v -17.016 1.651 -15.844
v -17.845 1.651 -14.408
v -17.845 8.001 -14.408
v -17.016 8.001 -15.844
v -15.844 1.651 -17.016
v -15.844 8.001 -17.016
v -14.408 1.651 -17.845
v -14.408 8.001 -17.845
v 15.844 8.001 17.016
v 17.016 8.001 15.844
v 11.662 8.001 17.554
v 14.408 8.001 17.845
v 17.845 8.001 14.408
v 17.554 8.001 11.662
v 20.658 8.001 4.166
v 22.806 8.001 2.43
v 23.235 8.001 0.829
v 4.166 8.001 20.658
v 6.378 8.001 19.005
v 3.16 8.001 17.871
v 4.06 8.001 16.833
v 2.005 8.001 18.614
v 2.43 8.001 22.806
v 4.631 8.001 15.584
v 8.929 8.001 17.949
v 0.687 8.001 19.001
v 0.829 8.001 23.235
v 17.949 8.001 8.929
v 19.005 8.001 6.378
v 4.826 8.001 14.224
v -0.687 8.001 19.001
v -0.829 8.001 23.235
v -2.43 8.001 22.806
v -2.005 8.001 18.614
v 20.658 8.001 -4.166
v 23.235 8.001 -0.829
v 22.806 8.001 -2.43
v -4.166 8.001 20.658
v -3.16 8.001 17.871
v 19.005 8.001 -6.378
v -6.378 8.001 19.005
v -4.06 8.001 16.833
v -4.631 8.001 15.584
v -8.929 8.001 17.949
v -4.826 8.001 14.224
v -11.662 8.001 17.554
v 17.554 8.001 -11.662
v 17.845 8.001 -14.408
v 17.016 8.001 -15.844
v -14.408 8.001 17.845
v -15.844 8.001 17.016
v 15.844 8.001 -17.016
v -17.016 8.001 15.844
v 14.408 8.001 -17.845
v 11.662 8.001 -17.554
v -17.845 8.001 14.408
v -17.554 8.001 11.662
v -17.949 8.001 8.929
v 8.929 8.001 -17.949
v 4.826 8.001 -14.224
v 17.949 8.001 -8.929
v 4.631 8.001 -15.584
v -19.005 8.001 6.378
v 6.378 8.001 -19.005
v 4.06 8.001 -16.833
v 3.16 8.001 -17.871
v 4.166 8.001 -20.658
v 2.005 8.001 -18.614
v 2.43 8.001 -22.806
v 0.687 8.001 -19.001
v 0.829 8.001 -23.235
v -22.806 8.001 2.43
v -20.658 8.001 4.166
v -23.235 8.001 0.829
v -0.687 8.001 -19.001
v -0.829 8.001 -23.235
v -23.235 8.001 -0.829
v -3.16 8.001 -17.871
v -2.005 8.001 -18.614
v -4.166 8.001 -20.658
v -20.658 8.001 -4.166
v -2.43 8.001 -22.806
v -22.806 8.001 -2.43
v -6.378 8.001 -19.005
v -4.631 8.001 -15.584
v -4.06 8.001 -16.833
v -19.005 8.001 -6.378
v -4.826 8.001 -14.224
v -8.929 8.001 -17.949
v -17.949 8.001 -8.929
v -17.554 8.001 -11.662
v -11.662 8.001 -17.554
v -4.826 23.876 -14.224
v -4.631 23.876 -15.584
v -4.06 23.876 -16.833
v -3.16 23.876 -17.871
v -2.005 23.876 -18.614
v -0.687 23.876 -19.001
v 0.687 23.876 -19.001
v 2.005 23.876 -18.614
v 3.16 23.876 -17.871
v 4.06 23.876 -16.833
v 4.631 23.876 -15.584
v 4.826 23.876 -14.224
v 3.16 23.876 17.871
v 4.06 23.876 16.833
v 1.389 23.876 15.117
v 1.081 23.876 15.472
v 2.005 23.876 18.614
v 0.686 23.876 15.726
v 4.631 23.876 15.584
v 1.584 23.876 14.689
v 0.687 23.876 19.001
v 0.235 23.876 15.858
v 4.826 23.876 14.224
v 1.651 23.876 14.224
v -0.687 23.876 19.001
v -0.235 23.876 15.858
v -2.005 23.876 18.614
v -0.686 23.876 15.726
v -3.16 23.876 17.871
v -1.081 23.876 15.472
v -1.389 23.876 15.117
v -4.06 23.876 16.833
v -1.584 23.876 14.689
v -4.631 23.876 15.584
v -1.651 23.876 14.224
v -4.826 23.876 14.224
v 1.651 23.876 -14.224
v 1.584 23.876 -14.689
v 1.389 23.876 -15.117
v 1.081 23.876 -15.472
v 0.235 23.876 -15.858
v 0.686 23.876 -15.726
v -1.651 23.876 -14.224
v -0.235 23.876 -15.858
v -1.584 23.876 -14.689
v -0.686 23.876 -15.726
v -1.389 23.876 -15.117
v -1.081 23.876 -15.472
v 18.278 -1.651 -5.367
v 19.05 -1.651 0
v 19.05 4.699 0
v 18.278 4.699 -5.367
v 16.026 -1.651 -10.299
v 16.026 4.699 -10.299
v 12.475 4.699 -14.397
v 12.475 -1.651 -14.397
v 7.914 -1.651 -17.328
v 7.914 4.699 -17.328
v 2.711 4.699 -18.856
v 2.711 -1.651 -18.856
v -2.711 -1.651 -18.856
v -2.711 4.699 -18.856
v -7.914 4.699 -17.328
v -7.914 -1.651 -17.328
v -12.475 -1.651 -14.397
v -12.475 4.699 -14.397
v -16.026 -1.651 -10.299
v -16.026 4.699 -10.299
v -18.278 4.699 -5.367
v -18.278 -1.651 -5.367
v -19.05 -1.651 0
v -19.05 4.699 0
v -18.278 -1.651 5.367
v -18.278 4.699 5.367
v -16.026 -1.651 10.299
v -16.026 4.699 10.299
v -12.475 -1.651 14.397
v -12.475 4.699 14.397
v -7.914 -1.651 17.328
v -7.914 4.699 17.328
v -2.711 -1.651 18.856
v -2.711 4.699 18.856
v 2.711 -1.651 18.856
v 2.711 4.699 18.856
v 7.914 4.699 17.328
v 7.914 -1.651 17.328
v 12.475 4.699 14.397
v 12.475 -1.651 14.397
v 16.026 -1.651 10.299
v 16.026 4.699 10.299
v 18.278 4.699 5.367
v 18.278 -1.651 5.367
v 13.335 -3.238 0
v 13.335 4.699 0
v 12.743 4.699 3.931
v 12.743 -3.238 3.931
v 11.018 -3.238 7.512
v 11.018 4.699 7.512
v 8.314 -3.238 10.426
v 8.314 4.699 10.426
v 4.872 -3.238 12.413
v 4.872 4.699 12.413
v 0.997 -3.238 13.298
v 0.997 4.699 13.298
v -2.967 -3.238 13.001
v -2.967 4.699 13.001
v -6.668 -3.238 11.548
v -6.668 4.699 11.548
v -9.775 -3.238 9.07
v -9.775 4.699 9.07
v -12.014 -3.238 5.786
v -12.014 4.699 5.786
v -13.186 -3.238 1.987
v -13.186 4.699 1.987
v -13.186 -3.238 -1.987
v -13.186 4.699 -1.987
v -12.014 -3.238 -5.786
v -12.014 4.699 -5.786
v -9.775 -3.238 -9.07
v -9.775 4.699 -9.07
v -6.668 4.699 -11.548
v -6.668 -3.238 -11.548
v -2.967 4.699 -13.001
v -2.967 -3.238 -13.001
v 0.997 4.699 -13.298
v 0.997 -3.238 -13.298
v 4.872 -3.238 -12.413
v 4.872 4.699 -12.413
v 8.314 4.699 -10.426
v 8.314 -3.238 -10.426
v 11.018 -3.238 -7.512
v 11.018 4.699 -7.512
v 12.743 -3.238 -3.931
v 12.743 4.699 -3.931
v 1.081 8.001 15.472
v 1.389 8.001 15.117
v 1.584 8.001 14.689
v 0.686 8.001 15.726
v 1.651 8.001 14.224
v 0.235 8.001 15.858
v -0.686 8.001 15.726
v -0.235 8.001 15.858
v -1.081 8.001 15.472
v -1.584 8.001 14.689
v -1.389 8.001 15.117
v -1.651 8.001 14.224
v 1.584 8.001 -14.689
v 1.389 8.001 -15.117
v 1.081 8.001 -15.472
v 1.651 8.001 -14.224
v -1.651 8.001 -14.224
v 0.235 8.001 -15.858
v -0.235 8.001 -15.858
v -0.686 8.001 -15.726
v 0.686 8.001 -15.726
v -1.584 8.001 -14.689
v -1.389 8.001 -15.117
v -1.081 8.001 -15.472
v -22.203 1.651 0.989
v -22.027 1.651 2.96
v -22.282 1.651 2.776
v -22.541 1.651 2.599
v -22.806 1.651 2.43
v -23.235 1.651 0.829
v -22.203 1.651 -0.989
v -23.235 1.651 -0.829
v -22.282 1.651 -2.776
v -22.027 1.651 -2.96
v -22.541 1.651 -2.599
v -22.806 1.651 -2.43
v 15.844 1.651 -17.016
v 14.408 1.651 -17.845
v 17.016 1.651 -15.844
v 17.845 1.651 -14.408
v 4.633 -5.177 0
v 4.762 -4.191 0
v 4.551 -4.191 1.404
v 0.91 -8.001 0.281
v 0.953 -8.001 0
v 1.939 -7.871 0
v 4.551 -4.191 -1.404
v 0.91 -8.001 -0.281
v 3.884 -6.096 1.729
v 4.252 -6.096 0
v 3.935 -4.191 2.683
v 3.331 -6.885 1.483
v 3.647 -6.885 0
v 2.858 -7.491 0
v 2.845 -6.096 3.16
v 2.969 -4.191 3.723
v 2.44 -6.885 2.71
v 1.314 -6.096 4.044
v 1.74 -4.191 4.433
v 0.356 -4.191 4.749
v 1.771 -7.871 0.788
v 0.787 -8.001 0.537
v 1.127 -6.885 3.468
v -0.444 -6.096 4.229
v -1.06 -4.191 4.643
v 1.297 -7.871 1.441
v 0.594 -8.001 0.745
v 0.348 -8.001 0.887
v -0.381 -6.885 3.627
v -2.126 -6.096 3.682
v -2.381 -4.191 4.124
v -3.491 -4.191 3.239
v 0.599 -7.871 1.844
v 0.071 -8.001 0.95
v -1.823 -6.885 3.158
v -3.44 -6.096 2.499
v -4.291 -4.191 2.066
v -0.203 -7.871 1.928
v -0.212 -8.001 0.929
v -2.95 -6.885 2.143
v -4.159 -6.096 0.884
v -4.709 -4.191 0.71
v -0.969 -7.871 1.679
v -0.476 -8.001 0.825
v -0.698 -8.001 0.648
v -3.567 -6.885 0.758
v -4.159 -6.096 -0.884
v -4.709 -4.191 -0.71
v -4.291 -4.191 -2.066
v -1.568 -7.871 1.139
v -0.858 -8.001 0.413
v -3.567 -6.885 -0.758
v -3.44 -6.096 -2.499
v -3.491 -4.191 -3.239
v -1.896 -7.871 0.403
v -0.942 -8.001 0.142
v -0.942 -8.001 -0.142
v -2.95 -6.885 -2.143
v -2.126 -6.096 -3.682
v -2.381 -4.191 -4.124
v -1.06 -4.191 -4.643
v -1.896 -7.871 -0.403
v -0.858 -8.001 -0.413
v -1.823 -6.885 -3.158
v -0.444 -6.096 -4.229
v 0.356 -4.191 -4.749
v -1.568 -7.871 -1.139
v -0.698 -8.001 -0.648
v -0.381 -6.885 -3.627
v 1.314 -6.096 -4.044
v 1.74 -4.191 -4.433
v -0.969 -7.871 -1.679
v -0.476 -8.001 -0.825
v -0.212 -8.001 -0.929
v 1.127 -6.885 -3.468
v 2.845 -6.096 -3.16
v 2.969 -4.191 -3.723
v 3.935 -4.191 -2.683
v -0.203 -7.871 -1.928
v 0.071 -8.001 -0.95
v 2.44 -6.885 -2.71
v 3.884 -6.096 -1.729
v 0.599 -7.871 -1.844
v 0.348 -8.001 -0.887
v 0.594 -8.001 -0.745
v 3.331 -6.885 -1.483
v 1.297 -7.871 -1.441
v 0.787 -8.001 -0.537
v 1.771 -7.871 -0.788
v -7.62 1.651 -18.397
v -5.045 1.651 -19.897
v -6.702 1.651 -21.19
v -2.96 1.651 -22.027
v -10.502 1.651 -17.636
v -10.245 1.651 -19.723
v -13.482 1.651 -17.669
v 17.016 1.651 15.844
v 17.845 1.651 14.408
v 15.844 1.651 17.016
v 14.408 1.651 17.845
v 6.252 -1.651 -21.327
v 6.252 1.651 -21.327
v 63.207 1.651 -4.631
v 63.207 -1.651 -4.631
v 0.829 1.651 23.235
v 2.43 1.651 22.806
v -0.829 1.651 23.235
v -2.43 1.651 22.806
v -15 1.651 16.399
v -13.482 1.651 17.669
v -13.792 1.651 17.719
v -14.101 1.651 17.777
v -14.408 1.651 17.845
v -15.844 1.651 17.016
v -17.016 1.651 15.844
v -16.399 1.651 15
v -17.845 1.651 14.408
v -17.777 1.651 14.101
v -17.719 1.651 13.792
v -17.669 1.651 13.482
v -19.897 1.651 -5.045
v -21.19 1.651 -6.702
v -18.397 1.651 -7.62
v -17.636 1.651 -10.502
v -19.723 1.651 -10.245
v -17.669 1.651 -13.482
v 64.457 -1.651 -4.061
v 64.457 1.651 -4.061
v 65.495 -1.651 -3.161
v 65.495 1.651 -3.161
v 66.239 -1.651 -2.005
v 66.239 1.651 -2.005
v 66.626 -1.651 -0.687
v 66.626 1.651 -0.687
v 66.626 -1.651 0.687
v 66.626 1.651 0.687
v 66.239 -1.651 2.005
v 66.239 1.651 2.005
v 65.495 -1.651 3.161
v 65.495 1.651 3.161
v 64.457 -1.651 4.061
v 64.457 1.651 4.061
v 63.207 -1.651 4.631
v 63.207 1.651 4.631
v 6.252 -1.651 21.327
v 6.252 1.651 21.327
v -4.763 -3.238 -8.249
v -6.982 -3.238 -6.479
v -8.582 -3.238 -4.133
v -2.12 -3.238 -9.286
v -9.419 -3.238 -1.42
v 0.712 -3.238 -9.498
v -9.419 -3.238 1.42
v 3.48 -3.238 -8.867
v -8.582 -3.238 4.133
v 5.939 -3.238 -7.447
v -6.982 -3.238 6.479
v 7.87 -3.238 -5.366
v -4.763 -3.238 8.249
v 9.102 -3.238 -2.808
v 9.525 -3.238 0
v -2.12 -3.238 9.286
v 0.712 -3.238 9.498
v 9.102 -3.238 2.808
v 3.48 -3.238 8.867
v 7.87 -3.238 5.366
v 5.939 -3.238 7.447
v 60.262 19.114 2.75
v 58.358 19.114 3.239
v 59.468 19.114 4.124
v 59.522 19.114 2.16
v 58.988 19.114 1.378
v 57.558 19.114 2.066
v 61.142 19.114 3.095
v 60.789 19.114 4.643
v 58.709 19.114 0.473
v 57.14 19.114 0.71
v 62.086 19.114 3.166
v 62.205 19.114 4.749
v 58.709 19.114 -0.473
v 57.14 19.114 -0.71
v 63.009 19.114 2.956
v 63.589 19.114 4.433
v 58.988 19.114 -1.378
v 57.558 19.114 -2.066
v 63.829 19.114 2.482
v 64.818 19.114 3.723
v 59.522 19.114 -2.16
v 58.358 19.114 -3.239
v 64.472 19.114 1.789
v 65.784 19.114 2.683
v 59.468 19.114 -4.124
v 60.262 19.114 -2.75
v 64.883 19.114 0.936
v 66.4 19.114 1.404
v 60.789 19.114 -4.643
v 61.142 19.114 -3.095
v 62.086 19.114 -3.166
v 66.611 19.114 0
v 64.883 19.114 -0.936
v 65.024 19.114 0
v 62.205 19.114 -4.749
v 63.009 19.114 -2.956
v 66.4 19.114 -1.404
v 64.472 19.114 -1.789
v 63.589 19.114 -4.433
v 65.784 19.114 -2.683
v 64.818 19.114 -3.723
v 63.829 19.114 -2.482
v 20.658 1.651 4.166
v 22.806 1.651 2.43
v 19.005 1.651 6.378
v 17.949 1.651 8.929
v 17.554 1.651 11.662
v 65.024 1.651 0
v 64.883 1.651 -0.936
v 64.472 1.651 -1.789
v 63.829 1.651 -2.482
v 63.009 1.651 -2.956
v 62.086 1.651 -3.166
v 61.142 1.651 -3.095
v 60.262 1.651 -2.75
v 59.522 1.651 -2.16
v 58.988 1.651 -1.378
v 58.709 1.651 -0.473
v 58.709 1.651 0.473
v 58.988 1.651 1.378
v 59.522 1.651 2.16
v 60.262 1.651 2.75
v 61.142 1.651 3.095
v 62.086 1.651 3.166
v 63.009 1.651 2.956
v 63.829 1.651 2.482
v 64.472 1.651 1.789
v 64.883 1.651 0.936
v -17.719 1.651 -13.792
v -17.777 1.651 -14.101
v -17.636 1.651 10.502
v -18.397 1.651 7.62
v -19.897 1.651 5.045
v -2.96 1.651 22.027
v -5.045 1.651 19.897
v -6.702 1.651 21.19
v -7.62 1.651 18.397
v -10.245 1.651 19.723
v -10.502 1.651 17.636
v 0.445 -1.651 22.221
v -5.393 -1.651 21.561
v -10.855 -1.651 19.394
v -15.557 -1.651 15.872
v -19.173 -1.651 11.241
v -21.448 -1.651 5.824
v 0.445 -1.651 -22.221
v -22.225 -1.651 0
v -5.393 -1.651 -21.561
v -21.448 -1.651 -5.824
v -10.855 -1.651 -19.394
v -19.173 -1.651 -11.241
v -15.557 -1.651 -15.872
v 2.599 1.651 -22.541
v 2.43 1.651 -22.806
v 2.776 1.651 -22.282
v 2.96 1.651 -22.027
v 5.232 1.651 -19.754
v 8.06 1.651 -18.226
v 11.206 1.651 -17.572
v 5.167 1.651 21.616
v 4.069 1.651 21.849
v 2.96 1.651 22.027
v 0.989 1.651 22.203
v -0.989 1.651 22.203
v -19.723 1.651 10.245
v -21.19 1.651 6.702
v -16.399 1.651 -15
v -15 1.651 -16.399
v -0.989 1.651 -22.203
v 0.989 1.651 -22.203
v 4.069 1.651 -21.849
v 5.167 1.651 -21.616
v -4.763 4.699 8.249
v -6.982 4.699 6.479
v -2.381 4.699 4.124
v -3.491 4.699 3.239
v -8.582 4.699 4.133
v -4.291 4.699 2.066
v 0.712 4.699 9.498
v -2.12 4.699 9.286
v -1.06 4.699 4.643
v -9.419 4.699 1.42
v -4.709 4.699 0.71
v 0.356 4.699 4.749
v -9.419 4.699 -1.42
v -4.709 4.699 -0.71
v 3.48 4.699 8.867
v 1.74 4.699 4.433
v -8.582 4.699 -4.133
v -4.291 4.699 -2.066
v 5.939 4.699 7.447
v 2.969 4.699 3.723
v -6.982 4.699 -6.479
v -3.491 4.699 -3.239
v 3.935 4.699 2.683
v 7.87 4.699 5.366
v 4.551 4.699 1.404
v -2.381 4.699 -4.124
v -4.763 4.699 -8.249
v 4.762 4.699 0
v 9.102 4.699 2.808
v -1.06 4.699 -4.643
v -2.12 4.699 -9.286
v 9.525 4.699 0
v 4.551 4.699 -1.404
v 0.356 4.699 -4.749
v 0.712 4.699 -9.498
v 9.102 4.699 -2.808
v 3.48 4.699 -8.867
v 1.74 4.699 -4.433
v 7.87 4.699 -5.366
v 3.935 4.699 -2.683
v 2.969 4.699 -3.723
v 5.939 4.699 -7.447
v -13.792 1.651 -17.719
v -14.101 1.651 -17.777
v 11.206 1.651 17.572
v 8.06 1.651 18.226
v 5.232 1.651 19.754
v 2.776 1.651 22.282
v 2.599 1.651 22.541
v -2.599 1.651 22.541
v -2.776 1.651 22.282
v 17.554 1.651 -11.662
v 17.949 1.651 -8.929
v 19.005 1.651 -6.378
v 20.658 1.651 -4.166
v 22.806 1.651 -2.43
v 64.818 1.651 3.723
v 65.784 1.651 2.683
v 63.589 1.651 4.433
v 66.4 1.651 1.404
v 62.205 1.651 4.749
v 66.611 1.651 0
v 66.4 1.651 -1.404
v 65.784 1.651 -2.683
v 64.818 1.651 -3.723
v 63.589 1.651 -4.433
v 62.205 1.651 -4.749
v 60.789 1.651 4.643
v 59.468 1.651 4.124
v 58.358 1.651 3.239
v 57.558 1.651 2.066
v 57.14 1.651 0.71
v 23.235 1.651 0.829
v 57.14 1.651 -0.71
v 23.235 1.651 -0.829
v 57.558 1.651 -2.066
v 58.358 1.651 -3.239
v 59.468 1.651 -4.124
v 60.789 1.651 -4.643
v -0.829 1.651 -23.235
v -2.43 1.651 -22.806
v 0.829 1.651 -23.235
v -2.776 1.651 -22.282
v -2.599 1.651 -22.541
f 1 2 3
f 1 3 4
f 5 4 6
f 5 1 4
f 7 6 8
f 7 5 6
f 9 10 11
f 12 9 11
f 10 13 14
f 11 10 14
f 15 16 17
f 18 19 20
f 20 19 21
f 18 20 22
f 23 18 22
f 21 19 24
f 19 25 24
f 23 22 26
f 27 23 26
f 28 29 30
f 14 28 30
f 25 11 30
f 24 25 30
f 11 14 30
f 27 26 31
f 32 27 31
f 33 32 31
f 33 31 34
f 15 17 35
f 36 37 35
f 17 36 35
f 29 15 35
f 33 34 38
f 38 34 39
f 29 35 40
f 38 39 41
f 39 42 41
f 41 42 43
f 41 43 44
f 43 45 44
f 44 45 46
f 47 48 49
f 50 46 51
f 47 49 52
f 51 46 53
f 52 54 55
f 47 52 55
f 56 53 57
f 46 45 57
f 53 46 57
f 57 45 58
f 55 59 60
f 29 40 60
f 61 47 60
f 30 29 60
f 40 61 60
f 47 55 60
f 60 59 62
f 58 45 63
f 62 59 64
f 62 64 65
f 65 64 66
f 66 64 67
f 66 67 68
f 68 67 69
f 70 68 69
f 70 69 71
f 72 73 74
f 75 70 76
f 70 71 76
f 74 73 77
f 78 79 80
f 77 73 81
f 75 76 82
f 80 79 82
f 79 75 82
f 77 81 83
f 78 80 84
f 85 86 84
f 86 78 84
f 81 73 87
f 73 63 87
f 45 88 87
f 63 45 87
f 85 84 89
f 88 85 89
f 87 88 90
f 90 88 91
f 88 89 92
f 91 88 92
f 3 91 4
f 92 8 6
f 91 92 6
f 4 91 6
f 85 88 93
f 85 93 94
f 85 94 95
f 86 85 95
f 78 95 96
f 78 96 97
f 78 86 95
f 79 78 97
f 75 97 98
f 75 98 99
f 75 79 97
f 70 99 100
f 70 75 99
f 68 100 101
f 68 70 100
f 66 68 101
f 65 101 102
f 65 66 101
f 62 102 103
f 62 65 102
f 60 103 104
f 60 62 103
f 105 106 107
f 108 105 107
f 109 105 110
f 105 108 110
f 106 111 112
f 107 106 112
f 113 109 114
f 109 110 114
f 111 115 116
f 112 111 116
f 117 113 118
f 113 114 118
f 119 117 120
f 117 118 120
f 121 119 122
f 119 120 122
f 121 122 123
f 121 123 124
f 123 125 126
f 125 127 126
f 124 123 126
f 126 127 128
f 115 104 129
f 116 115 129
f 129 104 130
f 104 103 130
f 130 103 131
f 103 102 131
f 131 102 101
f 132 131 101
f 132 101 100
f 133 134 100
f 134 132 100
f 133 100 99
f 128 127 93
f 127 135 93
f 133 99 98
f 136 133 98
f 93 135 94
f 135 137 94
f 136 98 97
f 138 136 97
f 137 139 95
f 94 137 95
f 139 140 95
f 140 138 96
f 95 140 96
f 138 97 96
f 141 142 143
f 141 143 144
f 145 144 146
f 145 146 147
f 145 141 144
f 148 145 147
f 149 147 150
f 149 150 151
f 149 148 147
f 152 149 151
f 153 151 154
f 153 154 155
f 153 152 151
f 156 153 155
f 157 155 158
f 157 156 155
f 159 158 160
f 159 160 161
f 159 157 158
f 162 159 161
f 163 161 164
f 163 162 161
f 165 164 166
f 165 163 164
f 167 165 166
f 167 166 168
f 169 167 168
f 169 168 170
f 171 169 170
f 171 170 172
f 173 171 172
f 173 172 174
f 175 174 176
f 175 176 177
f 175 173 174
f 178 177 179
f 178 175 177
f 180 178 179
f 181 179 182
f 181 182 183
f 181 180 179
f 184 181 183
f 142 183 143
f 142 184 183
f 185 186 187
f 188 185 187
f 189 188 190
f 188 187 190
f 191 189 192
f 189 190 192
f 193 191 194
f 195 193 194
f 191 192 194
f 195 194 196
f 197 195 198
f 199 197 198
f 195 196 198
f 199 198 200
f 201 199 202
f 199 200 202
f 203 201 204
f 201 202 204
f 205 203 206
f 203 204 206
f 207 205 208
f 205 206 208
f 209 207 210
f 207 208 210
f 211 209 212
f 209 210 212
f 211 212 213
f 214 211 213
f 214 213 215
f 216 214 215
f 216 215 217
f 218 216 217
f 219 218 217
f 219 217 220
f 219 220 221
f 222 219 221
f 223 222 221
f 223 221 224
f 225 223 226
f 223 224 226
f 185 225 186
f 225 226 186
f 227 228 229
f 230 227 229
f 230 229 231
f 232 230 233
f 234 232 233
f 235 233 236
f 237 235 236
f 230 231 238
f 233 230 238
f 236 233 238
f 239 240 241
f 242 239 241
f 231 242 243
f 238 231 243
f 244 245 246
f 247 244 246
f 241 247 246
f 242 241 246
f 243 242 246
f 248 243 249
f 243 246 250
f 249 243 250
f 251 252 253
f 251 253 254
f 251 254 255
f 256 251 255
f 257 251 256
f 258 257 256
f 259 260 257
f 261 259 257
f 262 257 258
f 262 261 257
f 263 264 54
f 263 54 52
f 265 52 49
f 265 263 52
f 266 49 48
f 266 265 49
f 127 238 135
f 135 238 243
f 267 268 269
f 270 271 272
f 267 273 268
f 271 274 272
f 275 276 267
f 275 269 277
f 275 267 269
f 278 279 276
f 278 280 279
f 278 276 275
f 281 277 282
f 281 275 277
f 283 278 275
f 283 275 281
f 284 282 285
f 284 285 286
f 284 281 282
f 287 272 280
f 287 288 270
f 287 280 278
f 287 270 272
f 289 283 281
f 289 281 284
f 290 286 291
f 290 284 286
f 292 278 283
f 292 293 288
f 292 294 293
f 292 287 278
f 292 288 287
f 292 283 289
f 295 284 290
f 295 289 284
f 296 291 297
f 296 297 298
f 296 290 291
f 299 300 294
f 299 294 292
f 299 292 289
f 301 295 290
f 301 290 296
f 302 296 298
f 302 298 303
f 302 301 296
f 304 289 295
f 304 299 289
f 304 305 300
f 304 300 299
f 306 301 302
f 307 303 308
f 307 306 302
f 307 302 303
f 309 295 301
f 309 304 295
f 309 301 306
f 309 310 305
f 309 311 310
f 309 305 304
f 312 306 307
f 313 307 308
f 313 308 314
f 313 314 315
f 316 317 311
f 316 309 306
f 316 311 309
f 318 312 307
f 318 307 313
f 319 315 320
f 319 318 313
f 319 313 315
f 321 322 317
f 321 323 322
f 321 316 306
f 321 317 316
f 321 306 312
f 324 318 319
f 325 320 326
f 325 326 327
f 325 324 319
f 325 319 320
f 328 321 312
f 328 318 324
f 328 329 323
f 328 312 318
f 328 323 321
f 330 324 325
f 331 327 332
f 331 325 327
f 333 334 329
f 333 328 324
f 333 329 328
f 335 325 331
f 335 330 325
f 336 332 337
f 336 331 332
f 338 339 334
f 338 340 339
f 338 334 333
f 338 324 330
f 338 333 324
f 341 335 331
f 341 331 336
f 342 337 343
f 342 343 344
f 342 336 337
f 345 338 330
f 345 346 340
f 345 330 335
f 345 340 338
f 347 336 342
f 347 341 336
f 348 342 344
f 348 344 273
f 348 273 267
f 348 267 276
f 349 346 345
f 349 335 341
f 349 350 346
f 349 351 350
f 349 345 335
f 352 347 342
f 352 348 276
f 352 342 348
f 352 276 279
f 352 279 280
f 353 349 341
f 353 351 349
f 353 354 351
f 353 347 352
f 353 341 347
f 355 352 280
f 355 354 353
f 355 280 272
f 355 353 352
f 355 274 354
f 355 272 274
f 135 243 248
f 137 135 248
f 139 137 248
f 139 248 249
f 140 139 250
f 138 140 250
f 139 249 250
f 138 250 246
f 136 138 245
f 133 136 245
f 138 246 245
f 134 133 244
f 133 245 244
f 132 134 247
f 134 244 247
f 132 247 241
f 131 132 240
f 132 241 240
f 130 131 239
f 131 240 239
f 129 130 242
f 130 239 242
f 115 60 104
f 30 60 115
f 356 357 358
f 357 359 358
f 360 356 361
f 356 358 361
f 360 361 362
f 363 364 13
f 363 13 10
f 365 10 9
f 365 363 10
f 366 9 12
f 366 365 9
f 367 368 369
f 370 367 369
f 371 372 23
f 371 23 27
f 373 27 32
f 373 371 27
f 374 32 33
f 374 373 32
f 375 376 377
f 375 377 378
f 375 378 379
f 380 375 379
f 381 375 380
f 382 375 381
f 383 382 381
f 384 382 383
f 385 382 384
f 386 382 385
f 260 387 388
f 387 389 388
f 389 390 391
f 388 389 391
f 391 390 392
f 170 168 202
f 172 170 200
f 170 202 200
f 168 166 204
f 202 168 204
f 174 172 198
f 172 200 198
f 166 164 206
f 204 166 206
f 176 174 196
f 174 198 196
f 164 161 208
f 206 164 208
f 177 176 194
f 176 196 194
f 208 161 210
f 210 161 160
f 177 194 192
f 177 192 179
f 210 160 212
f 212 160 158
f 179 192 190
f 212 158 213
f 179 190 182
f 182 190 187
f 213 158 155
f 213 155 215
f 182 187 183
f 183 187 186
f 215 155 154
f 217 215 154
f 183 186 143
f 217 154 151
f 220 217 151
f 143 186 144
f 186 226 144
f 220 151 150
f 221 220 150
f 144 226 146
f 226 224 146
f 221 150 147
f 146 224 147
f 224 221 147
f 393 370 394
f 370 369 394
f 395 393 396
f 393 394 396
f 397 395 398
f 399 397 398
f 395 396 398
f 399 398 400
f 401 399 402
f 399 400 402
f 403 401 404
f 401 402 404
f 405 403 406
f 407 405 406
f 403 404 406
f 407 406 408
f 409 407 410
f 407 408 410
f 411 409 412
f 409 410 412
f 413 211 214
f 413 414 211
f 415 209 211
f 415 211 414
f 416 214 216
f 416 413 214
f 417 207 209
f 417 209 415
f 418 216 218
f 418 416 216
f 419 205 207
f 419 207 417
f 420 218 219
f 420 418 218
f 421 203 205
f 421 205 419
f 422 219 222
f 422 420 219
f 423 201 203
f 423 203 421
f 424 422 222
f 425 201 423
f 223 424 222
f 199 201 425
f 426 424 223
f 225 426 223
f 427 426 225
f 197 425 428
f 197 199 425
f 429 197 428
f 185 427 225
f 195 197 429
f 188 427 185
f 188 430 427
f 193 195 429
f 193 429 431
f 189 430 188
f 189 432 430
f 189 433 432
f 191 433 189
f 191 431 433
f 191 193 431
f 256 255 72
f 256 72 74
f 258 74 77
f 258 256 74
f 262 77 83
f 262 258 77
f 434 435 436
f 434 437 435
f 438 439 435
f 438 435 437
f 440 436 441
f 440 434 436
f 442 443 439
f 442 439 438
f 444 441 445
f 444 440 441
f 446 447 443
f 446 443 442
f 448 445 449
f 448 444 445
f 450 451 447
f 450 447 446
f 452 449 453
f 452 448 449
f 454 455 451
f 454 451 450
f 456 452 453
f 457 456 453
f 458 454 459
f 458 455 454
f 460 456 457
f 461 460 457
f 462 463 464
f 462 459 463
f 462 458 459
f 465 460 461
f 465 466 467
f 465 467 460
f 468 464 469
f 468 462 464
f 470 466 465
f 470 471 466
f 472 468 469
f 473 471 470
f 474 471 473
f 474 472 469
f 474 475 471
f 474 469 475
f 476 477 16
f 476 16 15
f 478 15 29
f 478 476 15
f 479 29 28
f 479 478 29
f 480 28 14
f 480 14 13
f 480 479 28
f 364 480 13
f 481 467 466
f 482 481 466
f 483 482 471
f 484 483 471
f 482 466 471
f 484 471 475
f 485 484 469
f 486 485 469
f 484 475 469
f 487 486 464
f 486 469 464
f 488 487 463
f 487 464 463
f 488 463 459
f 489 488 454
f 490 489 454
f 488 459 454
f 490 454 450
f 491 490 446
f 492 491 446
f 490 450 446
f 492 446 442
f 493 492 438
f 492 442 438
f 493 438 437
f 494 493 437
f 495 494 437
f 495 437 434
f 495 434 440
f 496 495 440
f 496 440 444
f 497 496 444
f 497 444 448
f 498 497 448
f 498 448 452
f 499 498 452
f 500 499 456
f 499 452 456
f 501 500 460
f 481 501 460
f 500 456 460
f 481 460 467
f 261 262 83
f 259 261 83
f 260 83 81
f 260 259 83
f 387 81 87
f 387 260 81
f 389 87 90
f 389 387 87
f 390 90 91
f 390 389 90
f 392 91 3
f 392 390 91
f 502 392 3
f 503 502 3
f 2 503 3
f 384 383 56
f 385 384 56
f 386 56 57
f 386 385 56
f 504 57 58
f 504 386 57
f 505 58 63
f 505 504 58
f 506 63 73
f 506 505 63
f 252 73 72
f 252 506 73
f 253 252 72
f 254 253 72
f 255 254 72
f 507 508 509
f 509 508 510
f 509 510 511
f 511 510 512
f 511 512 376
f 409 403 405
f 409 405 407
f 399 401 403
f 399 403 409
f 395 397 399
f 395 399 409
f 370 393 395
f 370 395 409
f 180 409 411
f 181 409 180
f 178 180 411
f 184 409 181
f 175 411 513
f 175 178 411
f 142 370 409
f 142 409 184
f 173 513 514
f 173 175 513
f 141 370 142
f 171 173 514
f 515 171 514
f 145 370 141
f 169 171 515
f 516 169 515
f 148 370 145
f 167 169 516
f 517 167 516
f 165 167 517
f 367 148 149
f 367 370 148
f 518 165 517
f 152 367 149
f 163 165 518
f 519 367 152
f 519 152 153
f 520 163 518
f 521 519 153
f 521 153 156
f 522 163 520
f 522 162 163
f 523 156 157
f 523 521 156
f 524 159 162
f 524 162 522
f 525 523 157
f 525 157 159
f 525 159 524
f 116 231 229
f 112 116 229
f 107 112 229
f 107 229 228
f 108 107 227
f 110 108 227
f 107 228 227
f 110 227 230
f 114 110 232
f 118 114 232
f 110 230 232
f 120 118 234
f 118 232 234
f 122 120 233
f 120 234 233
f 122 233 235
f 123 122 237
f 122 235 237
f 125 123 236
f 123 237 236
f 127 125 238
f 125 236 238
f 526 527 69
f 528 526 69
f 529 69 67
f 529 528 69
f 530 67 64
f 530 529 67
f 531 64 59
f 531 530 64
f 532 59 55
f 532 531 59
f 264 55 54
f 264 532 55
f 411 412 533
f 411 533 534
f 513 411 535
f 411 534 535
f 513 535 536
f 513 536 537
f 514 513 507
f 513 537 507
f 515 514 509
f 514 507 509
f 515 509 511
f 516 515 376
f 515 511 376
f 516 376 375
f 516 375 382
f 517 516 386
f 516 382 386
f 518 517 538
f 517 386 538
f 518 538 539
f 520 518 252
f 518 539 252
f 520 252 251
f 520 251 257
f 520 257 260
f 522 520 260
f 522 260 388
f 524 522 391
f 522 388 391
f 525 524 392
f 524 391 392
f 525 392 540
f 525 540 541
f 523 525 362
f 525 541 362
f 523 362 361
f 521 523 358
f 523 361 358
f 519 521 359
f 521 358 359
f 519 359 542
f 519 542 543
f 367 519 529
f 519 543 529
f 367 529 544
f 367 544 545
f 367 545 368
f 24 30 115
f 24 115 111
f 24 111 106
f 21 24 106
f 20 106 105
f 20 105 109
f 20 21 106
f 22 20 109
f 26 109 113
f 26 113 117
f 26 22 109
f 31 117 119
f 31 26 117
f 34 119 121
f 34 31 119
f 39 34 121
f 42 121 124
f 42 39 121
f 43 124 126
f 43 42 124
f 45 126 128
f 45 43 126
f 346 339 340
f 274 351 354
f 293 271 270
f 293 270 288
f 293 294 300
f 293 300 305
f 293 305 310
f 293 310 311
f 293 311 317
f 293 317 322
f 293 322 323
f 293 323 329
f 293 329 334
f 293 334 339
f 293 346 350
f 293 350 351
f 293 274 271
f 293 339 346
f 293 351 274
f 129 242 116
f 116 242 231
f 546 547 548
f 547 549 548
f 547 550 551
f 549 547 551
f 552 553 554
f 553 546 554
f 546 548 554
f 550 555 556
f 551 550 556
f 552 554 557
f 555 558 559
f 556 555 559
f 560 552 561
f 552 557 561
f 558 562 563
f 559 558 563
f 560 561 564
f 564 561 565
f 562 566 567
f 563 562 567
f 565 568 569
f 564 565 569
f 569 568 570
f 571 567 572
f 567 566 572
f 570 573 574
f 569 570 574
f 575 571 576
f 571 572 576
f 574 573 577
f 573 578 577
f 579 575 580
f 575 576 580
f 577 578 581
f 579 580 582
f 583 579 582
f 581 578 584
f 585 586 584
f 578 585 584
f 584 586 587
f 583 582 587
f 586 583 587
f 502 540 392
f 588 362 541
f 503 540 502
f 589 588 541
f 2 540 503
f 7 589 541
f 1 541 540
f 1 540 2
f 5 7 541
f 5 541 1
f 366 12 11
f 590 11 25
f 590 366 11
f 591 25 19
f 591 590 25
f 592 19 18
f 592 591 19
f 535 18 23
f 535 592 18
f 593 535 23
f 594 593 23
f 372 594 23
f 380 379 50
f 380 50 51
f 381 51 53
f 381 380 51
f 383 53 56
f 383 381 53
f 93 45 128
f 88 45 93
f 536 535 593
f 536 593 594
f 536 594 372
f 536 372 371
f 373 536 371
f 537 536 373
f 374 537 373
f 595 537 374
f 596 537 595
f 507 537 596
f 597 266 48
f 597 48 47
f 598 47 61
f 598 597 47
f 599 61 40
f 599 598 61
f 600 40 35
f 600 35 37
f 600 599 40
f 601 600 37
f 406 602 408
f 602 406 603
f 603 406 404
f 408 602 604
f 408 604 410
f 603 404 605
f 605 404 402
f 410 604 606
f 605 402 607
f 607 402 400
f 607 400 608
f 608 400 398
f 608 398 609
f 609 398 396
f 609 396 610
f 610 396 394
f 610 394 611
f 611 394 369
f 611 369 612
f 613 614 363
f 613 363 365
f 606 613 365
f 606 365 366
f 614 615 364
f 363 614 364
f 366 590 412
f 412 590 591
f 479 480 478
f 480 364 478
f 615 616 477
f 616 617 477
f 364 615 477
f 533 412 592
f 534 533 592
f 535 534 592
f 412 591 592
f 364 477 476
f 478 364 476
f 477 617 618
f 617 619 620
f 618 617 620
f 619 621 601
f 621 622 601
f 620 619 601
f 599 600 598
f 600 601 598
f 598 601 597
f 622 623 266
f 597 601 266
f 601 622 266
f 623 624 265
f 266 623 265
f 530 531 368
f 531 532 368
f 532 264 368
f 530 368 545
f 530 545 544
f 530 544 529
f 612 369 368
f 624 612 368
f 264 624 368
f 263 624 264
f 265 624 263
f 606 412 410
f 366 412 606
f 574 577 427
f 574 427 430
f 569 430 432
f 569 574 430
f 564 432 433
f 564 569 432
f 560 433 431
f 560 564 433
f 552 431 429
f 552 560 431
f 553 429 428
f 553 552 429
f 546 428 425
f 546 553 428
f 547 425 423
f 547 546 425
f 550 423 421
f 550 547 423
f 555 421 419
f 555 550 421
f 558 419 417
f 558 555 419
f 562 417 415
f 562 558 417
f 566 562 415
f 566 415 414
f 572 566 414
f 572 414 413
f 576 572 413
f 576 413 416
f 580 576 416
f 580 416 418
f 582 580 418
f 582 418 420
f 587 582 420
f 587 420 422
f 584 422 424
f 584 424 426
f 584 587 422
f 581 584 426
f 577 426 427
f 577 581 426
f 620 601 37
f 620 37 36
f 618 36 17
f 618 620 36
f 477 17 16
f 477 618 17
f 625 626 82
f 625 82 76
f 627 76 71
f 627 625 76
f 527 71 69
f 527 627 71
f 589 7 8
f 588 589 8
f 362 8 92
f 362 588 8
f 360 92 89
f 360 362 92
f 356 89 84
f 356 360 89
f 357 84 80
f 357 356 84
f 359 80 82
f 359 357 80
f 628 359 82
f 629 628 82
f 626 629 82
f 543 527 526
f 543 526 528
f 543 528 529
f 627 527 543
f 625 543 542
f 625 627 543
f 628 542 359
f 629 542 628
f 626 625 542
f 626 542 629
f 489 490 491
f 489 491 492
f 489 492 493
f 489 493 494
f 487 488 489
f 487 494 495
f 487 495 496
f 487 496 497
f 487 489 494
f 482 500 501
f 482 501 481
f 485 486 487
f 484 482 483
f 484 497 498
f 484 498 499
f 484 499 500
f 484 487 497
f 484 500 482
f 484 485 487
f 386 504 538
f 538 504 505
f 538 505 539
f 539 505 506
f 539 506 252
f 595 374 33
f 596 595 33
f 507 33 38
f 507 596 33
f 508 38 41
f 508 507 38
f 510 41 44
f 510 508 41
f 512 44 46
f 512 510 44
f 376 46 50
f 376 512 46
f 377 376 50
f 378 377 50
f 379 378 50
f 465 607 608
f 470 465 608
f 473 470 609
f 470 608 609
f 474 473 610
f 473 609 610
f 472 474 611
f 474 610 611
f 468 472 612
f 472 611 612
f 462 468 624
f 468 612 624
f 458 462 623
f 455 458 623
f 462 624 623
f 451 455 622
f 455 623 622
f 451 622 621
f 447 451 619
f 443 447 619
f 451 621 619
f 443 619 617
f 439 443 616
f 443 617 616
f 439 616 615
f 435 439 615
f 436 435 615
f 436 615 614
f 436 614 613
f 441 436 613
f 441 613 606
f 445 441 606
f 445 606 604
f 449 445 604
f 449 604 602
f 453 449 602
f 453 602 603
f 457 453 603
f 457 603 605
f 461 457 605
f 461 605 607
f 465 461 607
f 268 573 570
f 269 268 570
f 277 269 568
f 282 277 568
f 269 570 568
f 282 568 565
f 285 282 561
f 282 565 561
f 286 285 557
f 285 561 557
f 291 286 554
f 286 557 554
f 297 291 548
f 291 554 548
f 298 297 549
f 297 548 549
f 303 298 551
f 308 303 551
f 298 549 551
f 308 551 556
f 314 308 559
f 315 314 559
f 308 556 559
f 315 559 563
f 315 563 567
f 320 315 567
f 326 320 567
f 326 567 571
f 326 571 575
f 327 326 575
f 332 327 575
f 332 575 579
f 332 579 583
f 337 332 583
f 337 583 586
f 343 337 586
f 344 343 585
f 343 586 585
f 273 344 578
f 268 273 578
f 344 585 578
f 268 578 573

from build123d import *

# Parameters (mm, degrees)
BOSS_EXTRUDE1_DEPTH = 1.651
BOSS_EXTRUDE2_DEPTH = 6.35
BOSS_EXTRUDE3_START = -6.35
BOSS_EXTRUDE3_DEPTH = 22.225
BOSS_EXTRUDE4_START = -1.5875
SKETCH5_R           = 4.7625
BOSS_EXTRUDE4_DEPTH = 19.05
SKETCH6_R           = 3.175
CUT_EXTRUDE1_DEPTH  = 17.4625
SKETCH7_R           = 19.05
CUT_EXTRUDE3_DEPTH  = 6.35
SKETCH8_R           = 13.335
SKETCH8_R_2         = 9.525
BOSS_EXTRUDE5_DEPTH = 7.9375
SKETCH9_R           = 4.7625
BOSS_EXTRUDE6_DEPTH = 12.7
FILLET3_R           = 3.81


with BuildPart() as part:
    # Sketch1 → Boss-Extrude1 (new body, symmetric)
    with BuildSketch(Plane(origin=(0, 0, 0), x_dir=(1, 0, 0), z_dir=(0, 1, 0))):
        with BuildLine():
            Line((6.252207392, 21.327459477), (63.206622177, 4.631105486))
            ThreePointArc((63.206622177, 4.631105486), (66.675, 0), (63.206622177, -4.631105486))
            Line((63.206622177, -4.631105486), (6.252207392, -21.327459477))
            ThreePointArc((6.252207392, -21.327459477), (-22.225, 0), (6.252207392, 21.327459477))
        make_face()
    extrude(amount=BOSS_EXTRUDE1_DEPTH, both=True)

    # Sketch2 → Boss-Extrude2 (add)
    with BuildSketch(Plane(origin=(0, 1.651, 0), x_dir=(1, 0, 0), z_dir=(0, 1, 0))):
        with BuildLine():
            ThreePointArc((-17.844535667, 14.407940431), (-16.468028697, 16.468028697), (-14.407940431, 17.844535667))
            ThreePointArc((-14.407940431, 17.844535667), (-7.620469402, 18.397440581), (-2.430039796, 22.80594456))
            ThreePointArc((-2.430039796, 22.80594456), (0, 23.289309528), (2.430039796, 22.80594456))
            ThreePointArc((2.430039796, 22.80594456), (7.620469402, 18.397440581), (14.407940431, 17.844535667))
            ThreePointArc((14.407940431, 17.844535667), (16.468028697, 16.468028697), (17.844535667, 14.407940431))
            ThreePointArc((17.844535667, 14.407940431), (18.397440581, 7.620469402), (22.80594456, 2.430039796))
            ThreePointArc((22.80594456, 2.430039796), (23.289309528, 0), (22.80594456, -2.430039796))
            ThreePointArc((22.80594456, -2.430039796), (18.397440581, -7.620469402), (17.844535667, -14.407940431))
            ThreePointArc((17.844535667, -14.407940431), (16.468028697, -16.468028697), (14.407940431, -17.844535667))
            ThreePointArc((14.407940431, -17.844535667), (7.620469402, -18.397440581), (2.430039796, -22.80594456))
            ThreePointArc((2.430039796, -22.80594456), (0, -23.289309528), (-2.430039796, -22.80594456))
            ThreePointArc((-2.430039796, -22.80594456), (-7.620469402, -18.397440581), (-14.407940431, -17.844535667))
            ThreePointArc((-14.407940431, -17.844535667), (-16.468028697, -16.468028697), (-17.844535667, -14.407940431))
            ThreePointArc((-17.844535667, -14.407940431), (-18.397440581, -7.620469402), (-22.80594456, -2.430039796))
            ThreePointArc((-22.80594456, -2.430039796), (-23.289309528, 0), (-22.80594456, 2.430039796))
            ThreePointArc((-22.80594456, 2.430039796), (-18.397440581, 7.620469402), (-17.844535667, 14.407940431))
        make_face()
    extrude(amount=BOSS_EXTRUDE2_DEPTH)

    # Sketch4 → Boss-Extrude3 (add)
    with BuildSketch(Plane(origin=(0, 8.001, 0), x_dir=(1, 0, 0), z_dir=(0, 1, 0)).offset(BOSS_EXTRUDE3_START)):
        with BuildLine():
            Line((-4.826, -14.224), (-4.826, 14.224))
            ThreePointArc((-4.826, 14.224), (0, 19.05), (4.826, 14.224))
            Line((4.826, 14.224), (4.826, -14.224))
            ThreePointArc((4.826, -14.224), (0, -19.05), (-4.826, -14.224))
        make_face()
        with BuildLine():
            Line((-1.651, -14.224), (-1.651, 14.224))
            ThreePointArc((-1.651, 14.224), (0, 15.875), (1.651, 14.224))
            Line((1.651, 14.224), (1.651, -14.224))
            ThreePointArc((1.651, -14.224), (0, -15.875), (-1.651, -14.224))
        make_face(mode=Mode.SUBTRACT)
    extrude(amount=BOSS_EXTRUDE3_DEPTH)

    # Sketch5 → Boss-Extrude4 (add)
    with BuildSketch(Plane(origin=(0, 1.651, 0), x_dir=(1, 0, 0), z_dir=(0, 1, 0)).offset(BOSS_EXTRUDE4_START)):
        with Locations((61.849, 0)):
            Circle(SKETCH5_R)
    extrude(amount=BOSS_EXTRUDE4_DEPTH)

    # Sketch6 → Cut-Extrude1 (cut)
    with BuildSketch(Plane(origin=(0, 19.1135, 0), x_dir=(1, 0, 0), z_dir=(0, 1, 0))):
        with Locations((61.849, 0)):
            Circle(SKETCH6_R)
    extrude(amount=-CUT_EXTRUDE1_DEPTH, mode=Mode.SUBTRACT)

    # Sketch7 → Cut-Extrude3 (cut)
    with BuildSketch(Plane(origin=(0, -1.651, 0), x_dir=(1, 0, 0), z_dir=(0, 1, 0))):
        Circle(SKETCH7_R)
    extrude(amount=CUT_EXTRUDE3_DEPTH, mode=Mode.SUBTRACT)

    # Sketch8 → Boss-Extrude5 (add)
    with BuildSketch(Plane.XZ.offset(-4.699)):
        Circle(SKETCH8_R)
        Circle(SKETCH8_R_2, mode=Mode.SUBTRACT)
    extrude(amount=BOSS_EXTRUDE5_DEPTH)

    # Sketch9 → Boss-Extrude6 (add)
    with BuildSketch(Plane.XZ.offset(-4.699)):
        Circle(SKETCH9_R)
    extrude(amount=BOSS_EXTRUDE6_DEPTH)

    # Fillet3
    fillet3_edges = [part.edges().sort_by_distance(p)[0] for p in [
        (-4.7625, -8.001, 0),
    ]]
    fillet(fillet3_edges, radius=FILLET3_R)


solid = part.part
